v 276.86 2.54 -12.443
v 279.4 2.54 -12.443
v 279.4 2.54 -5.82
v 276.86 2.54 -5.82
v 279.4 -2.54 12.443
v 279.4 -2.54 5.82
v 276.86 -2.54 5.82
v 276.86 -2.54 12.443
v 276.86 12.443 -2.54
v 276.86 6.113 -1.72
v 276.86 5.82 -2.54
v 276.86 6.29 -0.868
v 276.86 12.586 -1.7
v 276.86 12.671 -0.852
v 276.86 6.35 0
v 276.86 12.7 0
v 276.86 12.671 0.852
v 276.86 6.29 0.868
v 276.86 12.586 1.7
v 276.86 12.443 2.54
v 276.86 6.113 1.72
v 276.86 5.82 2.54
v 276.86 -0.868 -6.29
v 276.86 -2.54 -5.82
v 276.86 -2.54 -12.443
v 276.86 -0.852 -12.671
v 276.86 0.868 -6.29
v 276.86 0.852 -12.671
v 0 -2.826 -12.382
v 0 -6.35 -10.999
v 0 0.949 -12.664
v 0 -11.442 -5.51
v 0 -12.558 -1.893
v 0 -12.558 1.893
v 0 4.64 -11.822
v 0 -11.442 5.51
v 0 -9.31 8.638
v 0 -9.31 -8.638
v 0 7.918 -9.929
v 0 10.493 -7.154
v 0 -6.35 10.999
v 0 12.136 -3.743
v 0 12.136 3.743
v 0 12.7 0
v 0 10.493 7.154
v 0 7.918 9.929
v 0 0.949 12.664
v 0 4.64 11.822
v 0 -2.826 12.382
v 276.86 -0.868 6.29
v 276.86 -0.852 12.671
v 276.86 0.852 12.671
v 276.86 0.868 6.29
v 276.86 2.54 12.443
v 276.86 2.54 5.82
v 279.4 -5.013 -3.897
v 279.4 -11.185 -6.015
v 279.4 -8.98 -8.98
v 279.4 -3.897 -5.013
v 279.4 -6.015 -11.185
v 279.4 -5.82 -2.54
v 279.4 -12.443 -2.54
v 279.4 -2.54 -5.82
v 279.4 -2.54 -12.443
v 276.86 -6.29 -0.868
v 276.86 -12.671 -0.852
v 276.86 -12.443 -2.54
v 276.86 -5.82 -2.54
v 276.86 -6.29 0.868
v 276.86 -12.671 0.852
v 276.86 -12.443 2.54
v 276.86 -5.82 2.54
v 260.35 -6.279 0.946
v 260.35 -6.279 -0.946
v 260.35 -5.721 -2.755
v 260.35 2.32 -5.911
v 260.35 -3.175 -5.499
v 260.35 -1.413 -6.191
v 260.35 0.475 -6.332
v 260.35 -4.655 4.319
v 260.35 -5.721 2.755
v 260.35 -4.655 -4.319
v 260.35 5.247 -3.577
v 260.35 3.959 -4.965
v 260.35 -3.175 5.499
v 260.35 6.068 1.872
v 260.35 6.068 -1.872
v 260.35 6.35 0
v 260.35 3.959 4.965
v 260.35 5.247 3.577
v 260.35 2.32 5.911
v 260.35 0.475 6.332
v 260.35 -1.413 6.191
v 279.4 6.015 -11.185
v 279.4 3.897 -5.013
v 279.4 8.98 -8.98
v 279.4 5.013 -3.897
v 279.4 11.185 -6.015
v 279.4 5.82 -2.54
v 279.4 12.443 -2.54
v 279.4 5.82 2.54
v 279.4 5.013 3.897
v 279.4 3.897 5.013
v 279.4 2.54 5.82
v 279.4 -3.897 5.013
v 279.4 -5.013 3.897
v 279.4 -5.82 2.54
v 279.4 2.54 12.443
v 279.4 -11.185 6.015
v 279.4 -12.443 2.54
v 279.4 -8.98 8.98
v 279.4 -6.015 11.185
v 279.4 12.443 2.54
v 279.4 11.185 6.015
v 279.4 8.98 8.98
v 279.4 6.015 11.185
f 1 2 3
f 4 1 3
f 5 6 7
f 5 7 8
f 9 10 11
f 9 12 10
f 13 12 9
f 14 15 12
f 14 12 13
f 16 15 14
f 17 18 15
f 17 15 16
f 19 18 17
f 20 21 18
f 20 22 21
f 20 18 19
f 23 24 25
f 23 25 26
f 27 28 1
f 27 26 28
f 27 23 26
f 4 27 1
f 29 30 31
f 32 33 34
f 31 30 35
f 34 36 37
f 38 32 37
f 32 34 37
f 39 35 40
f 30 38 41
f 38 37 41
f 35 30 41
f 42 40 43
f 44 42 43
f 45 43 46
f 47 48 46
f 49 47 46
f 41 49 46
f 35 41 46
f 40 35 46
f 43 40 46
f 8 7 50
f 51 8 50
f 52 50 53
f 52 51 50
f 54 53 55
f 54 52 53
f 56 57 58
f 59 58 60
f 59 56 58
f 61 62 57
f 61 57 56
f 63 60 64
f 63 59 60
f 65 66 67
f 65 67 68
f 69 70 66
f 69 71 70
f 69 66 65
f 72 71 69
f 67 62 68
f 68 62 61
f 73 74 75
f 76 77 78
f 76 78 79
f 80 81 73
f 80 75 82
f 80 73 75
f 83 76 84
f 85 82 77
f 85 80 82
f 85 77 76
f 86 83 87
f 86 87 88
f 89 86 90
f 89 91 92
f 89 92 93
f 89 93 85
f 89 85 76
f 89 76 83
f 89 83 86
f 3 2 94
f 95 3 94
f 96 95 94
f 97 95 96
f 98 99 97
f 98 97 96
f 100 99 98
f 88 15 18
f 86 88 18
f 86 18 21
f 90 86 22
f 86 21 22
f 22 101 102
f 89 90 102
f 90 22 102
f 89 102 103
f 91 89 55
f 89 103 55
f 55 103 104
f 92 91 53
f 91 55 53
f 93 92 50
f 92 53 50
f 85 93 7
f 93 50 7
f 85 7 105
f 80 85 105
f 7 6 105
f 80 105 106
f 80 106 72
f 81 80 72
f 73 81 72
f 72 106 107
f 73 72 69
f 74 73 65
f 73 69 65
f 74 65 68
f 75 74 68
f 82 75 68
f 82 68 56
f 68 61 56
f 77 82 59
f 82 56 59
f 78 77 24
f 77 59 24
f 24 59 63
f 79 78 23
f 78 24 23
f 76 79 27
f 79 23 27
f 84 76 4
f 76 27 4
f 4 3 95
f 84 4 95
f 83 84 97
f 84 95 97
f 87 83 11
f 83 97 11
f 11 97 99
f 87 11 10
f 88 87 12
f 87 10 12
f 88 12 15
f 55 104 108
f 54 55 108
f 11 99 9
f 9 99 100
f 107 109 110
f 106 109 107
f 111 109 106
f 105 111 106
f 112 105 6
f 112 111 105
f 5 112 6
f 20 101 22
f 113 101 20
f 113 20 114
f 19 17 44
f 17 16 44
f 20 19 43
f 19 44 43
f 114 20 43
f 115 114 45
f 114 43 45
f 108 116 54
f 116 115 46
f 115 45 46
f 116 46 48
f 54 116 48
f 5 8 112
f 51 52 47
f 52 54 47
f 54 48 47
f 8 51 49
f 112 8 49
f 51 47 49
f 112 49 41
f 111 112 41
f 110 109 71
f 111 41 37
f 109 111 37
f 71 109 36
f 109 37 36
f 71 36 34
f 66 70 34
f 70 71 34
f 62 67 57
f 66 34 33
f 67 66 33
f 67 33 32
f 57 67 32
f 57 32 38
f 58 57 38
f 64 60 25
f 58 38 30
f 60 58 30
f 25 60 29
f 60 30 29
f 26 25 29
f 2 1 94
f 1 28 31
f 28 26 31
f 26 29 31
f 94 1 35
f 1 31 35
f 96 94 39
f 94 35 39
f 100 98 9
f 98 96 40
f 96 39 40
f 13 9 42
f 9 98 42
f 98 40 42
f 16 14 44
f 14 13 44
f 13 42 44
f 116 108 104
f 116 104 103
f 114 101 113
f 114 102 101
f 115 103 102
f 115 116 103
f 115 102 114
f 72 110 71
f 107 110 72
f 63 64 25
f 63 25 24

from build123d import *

# Parameters (mm, degrees)
F0_R     = 12.7
F1_DEPTH = 279.4
F2_R     = 6.35
F3_DEPTH = 2.54
F4_DEPTH = 19.05
F5_W     = 18.163441
F5_H     = 5.08
F5_W_2   = 5.08
F5_H_2   = 19.159987
F5_W_3   = 24.760097
F5_H_3   = 22.090506
F6_DEPTH = 2.54


with BuildPart() as f1:
    # F0 (on Right) → F1 (new body)
    with BuildSketch(Plane.YZ):
        Circle(F0_R)
    extrude(amount=F1_DEPTH)

    # F2 (on face) → F3 (cut)
    with BuildSketch(Plane.YZ.offset(279.4)):
        Circle(F2_R)
    extrude(amount=-F3_DEPTH, mode=Mode.SUBTRACT)

    # F2 (on face) → F4 (cut)
    with BuildSketch(Plane.YZ.offset(279.4)):
        Circle(F2_R)
    extrude(amount=-F4_DEPTH, mode=Mode.SUBTRACT)

    # F5 (on face) → F6 (cut)
    with BuildSketch(Plane.YZ.offset(279.4)):
        with Locations((-11.62172, 0)):
            Rectangle(F5_W, F5_H)
        with Locations((0, 12.119993)):
            Rectangle(F5_W_2, F5_H_2)
        with Locations((14.920048, 0)):
            Rectangle(F5_W_3, F5_H)
        with Locations((0, -13.585253)):
            Rectangle(F5_W_2, F5_H_3)
    extrude(amount=-F6_DEPTH, mode=Mode.SUBTRACT)


solid = f1.part
